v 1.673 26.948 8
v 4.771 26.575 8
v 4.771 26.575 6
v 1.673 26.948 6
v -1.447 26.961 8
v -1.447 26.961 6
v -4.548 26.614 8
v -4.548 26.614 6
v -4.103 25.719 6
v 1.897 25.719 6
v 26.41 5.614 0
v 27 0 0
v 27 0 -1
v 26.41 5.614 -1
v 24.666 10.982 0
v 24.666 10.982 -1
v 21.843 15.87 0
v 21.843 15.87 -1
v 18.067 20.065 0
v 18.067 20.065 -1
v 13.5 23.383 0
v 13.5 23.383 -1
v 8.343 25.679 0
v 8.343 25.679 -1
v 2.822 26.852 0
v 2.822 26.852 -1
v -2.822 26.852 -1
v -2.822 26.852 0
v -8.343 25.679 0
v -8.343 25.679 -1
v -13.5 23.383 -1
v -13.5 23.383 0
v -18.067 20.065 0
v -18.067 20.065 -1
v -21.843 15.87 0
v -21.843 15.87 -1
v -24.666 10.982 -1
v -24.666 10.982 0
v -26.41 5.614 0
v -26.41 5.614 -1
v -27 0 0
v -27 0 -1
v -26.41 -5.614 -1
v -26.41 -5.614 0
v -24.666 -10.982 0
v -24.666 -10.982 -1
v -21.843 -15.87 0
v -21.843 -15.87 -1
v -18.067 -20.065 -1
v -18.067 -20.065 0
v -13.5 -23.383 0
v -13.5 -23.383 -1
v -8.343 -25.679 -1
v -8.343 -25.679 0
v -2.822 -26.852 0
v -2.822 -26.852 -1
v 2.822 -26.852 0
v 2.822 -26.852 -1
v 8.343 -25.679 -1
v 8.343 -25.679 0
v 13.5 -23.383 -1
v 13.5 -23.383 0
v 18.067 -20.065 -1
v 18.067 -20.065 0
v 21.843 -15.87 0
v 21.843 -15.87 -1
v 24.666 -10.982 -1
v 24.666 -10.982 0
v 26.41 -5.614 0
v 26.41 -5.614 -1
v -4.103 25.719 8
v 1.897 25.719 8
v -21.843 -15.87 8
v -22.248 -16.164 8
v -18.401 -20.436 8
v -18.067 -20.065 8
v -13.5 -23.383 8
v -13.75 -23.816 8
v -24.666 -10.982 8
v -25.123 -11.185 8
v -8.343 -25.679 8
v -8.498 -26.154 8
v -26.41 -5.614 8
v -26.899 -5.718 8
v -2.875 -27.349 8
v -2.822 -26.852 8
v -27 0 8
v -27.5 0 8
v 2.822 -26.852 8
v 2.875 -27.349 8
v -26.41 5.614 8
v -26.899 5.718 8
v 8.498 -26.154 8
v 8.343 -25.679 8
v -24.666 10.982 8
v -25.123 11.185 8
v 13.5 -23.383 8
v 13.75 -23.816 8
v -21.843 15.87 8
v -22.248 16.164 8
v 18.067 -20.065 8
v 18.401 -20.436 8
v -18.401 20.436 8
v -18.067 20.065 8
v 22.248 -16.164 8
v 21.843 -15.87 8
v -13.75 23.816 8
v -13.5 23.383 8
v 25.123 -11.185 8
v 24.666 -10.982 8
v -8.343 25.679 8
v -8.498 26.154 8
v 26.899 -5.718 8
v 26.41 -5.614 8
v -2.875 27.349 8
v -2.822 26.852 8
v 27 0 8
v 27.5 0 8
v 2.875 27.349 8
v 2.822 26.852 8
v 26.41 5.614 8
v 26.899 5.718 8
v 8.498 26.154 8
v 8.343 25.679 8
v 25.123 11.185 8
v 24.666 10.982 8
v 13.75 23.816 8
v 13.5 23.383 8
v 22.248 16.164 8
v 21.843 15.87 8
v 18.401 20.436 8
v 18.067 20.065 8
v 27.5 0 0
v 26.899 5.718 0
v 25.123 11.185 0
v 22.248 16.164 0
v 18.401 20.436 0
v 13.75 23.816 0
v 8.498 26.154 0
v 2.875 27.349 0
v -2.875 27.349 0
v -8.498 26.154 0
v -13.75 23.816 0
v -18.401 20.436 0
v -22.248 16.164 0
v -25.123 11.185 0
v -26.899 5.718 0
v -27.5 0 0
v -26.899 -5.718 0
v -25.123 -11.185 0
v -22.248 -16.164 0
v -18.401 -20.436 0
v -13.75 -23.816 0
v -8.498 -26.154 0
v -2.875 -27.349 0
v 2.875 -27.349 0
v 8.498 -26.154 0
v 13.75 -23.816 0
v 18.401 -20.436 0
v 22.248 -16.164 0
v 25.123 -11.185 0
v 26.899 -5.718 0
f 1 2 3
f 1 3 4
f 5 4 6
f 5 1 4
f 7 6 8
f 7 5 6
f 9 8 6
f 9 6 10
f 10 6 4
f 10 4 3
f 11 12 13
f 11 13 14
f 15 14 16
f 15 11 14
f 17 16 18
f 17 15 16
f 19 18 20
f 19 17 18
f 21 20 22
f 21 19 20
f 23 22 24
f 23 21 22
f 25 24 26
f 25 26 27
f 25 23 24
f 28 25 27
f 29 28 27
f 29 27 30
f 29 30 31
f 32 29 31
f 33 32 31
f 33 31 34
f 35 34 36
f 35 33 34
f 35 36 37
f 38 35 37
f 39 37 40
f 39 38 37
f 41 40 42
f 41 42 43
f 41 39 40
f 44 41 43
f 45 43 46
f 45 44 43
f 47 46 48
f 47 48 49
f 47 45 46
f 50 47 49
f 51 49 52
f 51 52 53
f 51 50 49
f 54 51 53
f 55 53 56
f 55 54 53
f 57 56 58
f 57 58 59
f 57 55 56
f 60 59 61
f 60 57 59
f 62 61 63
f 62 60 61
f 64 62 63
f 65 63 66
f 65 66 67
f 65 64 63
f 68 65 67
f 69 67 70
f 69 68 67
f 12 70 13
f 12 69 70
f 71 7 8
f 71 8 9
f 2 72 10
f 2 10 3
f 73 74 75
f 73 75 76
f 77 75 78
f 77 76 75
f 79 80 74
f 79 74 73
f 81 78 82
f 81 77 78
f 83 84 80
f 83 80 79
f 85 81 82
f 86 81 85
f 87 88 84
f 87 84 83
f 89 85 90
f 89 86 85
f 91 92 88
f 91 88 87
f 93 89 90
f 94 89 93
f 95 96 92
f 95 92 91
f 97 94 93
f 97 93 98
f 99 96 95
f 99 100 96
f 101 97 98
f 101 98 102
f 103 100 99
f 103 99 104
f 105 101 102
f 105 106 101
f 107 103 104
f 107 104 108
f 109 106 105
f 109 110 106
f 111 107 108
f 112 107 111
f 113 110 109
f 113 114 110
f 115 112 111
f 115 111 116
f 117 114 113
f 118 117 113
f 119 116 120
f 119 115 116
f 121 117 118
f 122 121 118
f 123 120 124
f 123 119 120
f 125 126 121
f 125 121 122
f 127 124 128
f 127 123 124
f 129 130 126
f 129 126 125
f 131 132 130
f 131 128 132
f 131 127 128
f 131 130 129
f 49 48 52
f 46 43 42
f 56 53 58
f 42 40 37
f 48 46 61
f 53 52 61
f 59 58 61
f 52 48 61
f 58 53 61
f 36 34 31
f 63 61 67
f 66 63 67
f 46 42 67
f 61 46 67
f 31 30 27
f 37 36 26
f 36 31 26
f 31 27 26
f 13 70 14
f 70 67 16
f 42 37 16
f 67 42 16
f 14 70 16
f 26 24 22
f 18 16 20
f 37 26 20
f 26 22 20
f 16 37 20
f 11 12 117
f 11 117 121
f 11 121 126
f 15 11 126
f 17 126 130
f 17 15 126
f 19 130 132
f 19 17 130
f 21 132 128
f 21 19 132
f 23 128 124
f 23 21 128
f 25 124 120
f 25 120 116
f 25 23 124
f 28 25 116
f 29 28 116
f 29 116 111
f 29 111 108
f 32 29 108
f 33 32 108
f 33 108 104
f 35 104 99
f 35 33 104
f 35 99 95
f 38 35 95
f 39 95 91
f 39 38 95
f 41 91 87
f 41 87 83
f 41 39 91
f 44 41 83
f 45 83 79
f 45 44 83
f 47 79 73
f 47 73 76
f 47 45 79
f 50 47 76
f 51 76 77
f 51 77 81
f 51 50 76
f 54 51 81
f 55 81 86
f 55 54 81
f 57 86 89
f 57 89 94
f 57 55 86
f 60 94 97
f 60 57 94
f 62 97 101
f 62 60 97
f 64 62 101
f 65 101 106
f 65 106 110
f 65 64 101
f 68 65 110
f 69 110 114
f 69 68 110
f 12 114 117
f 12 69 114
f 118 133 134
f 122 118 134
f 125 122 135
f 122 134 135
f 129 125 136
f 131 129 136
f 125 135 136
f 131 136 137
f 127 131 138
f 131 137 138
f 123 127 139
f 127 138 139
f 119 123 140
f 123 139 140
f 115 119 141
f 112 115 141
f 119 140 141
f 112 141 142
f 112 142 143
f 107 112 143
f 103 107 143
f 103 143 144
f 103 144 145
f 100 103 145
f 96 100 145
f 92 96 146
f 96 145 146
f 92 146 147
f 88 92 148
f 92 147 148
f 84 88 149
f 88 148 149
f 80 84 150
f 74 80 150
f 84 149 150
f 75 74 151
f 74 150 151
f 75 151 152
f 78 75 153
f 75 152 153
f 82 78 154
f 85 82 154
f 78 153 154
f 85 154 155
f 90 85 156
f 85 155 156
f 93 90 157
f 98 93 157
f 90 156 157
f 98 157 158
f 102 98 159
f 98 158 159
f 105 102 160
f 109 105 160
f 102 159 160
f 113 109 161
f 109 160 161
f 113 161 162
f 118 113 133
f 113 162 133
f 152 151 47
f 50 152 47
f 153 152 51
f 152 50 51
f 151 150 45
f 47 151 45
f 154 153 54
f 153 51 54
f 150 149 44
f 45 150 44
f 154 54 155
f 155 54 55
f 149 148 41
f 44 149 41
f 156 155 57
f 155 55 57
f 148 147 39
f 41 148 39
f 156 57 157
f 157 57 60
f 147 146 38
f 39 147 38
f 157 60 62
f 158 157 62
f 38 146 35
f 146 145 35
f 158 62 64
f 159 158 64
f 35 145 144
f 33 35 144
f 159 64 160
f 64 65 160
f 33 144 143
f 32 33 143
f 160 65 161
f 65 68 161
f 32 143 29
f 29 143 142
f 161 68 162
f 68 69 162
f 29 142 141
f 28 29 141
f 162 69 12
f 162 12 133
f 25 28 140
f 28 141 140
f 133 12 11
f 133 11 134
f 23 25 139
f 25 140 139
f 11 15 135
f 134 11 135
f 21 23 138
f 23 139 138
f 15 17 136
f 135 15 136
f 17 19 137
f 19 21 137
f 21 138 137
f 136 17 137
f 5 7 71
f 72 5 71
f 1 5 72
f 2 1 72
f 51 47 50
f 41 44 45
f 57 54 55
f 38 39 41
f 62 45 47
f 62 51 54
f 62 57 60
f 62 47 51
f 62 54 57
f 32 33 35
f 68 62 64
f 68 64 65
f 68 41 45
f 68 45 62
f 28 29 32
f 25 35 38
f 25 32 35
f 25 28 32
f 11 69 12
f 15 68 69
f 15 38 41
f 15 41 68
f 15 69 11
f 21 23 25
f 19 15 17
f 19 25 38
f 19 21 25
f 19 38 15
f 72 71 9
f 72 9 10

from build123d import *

# Parameters (mm, degrees)
F0_R     = 27.5
F0_R_2   = 27
F1_DEPTH = 8
F2_DEPTH = 1
F4_DEPTH = 2


with BuildPart() as f1:
    # F0 (on Top) → F1 (new body)
    with BuildSketch(Plane.XY):
        Circle(F0_R)
        Circle(F0_R_2, mode=Mode.SUBTRACT)
    extrude(amount=F1_DEPTH)


with BuildPart() as f2:
    # F0 (on Top) → F2 (new body)
    with BuildSketch(Plane.XY):
        Circle(F0_R_2)
    extrude(amount=-F2_DEPTH)


with BuildPart() as f4:
    # F3 (on face) → F4 (new body)
    with BuildSketch(Plane.XY.offset(8)):
        with BuildLine():
            ThreePointArc((4.770946, 26.57514), (0.113249, 26.999762), (-4.547846, 26.614227))
            Line((-4.547846, 26.614227), (-4.103008, 25.718617))
            Line((-4.103008, 25.718617), (1.896992, 25.718617))
            Line((1.896992, 25.718617), (4.770946, 26.57514))
        make_face()
    extrude(amount=-F4_DEPTH)


solid = Compound([f1.part, f2.part, f4.part])
